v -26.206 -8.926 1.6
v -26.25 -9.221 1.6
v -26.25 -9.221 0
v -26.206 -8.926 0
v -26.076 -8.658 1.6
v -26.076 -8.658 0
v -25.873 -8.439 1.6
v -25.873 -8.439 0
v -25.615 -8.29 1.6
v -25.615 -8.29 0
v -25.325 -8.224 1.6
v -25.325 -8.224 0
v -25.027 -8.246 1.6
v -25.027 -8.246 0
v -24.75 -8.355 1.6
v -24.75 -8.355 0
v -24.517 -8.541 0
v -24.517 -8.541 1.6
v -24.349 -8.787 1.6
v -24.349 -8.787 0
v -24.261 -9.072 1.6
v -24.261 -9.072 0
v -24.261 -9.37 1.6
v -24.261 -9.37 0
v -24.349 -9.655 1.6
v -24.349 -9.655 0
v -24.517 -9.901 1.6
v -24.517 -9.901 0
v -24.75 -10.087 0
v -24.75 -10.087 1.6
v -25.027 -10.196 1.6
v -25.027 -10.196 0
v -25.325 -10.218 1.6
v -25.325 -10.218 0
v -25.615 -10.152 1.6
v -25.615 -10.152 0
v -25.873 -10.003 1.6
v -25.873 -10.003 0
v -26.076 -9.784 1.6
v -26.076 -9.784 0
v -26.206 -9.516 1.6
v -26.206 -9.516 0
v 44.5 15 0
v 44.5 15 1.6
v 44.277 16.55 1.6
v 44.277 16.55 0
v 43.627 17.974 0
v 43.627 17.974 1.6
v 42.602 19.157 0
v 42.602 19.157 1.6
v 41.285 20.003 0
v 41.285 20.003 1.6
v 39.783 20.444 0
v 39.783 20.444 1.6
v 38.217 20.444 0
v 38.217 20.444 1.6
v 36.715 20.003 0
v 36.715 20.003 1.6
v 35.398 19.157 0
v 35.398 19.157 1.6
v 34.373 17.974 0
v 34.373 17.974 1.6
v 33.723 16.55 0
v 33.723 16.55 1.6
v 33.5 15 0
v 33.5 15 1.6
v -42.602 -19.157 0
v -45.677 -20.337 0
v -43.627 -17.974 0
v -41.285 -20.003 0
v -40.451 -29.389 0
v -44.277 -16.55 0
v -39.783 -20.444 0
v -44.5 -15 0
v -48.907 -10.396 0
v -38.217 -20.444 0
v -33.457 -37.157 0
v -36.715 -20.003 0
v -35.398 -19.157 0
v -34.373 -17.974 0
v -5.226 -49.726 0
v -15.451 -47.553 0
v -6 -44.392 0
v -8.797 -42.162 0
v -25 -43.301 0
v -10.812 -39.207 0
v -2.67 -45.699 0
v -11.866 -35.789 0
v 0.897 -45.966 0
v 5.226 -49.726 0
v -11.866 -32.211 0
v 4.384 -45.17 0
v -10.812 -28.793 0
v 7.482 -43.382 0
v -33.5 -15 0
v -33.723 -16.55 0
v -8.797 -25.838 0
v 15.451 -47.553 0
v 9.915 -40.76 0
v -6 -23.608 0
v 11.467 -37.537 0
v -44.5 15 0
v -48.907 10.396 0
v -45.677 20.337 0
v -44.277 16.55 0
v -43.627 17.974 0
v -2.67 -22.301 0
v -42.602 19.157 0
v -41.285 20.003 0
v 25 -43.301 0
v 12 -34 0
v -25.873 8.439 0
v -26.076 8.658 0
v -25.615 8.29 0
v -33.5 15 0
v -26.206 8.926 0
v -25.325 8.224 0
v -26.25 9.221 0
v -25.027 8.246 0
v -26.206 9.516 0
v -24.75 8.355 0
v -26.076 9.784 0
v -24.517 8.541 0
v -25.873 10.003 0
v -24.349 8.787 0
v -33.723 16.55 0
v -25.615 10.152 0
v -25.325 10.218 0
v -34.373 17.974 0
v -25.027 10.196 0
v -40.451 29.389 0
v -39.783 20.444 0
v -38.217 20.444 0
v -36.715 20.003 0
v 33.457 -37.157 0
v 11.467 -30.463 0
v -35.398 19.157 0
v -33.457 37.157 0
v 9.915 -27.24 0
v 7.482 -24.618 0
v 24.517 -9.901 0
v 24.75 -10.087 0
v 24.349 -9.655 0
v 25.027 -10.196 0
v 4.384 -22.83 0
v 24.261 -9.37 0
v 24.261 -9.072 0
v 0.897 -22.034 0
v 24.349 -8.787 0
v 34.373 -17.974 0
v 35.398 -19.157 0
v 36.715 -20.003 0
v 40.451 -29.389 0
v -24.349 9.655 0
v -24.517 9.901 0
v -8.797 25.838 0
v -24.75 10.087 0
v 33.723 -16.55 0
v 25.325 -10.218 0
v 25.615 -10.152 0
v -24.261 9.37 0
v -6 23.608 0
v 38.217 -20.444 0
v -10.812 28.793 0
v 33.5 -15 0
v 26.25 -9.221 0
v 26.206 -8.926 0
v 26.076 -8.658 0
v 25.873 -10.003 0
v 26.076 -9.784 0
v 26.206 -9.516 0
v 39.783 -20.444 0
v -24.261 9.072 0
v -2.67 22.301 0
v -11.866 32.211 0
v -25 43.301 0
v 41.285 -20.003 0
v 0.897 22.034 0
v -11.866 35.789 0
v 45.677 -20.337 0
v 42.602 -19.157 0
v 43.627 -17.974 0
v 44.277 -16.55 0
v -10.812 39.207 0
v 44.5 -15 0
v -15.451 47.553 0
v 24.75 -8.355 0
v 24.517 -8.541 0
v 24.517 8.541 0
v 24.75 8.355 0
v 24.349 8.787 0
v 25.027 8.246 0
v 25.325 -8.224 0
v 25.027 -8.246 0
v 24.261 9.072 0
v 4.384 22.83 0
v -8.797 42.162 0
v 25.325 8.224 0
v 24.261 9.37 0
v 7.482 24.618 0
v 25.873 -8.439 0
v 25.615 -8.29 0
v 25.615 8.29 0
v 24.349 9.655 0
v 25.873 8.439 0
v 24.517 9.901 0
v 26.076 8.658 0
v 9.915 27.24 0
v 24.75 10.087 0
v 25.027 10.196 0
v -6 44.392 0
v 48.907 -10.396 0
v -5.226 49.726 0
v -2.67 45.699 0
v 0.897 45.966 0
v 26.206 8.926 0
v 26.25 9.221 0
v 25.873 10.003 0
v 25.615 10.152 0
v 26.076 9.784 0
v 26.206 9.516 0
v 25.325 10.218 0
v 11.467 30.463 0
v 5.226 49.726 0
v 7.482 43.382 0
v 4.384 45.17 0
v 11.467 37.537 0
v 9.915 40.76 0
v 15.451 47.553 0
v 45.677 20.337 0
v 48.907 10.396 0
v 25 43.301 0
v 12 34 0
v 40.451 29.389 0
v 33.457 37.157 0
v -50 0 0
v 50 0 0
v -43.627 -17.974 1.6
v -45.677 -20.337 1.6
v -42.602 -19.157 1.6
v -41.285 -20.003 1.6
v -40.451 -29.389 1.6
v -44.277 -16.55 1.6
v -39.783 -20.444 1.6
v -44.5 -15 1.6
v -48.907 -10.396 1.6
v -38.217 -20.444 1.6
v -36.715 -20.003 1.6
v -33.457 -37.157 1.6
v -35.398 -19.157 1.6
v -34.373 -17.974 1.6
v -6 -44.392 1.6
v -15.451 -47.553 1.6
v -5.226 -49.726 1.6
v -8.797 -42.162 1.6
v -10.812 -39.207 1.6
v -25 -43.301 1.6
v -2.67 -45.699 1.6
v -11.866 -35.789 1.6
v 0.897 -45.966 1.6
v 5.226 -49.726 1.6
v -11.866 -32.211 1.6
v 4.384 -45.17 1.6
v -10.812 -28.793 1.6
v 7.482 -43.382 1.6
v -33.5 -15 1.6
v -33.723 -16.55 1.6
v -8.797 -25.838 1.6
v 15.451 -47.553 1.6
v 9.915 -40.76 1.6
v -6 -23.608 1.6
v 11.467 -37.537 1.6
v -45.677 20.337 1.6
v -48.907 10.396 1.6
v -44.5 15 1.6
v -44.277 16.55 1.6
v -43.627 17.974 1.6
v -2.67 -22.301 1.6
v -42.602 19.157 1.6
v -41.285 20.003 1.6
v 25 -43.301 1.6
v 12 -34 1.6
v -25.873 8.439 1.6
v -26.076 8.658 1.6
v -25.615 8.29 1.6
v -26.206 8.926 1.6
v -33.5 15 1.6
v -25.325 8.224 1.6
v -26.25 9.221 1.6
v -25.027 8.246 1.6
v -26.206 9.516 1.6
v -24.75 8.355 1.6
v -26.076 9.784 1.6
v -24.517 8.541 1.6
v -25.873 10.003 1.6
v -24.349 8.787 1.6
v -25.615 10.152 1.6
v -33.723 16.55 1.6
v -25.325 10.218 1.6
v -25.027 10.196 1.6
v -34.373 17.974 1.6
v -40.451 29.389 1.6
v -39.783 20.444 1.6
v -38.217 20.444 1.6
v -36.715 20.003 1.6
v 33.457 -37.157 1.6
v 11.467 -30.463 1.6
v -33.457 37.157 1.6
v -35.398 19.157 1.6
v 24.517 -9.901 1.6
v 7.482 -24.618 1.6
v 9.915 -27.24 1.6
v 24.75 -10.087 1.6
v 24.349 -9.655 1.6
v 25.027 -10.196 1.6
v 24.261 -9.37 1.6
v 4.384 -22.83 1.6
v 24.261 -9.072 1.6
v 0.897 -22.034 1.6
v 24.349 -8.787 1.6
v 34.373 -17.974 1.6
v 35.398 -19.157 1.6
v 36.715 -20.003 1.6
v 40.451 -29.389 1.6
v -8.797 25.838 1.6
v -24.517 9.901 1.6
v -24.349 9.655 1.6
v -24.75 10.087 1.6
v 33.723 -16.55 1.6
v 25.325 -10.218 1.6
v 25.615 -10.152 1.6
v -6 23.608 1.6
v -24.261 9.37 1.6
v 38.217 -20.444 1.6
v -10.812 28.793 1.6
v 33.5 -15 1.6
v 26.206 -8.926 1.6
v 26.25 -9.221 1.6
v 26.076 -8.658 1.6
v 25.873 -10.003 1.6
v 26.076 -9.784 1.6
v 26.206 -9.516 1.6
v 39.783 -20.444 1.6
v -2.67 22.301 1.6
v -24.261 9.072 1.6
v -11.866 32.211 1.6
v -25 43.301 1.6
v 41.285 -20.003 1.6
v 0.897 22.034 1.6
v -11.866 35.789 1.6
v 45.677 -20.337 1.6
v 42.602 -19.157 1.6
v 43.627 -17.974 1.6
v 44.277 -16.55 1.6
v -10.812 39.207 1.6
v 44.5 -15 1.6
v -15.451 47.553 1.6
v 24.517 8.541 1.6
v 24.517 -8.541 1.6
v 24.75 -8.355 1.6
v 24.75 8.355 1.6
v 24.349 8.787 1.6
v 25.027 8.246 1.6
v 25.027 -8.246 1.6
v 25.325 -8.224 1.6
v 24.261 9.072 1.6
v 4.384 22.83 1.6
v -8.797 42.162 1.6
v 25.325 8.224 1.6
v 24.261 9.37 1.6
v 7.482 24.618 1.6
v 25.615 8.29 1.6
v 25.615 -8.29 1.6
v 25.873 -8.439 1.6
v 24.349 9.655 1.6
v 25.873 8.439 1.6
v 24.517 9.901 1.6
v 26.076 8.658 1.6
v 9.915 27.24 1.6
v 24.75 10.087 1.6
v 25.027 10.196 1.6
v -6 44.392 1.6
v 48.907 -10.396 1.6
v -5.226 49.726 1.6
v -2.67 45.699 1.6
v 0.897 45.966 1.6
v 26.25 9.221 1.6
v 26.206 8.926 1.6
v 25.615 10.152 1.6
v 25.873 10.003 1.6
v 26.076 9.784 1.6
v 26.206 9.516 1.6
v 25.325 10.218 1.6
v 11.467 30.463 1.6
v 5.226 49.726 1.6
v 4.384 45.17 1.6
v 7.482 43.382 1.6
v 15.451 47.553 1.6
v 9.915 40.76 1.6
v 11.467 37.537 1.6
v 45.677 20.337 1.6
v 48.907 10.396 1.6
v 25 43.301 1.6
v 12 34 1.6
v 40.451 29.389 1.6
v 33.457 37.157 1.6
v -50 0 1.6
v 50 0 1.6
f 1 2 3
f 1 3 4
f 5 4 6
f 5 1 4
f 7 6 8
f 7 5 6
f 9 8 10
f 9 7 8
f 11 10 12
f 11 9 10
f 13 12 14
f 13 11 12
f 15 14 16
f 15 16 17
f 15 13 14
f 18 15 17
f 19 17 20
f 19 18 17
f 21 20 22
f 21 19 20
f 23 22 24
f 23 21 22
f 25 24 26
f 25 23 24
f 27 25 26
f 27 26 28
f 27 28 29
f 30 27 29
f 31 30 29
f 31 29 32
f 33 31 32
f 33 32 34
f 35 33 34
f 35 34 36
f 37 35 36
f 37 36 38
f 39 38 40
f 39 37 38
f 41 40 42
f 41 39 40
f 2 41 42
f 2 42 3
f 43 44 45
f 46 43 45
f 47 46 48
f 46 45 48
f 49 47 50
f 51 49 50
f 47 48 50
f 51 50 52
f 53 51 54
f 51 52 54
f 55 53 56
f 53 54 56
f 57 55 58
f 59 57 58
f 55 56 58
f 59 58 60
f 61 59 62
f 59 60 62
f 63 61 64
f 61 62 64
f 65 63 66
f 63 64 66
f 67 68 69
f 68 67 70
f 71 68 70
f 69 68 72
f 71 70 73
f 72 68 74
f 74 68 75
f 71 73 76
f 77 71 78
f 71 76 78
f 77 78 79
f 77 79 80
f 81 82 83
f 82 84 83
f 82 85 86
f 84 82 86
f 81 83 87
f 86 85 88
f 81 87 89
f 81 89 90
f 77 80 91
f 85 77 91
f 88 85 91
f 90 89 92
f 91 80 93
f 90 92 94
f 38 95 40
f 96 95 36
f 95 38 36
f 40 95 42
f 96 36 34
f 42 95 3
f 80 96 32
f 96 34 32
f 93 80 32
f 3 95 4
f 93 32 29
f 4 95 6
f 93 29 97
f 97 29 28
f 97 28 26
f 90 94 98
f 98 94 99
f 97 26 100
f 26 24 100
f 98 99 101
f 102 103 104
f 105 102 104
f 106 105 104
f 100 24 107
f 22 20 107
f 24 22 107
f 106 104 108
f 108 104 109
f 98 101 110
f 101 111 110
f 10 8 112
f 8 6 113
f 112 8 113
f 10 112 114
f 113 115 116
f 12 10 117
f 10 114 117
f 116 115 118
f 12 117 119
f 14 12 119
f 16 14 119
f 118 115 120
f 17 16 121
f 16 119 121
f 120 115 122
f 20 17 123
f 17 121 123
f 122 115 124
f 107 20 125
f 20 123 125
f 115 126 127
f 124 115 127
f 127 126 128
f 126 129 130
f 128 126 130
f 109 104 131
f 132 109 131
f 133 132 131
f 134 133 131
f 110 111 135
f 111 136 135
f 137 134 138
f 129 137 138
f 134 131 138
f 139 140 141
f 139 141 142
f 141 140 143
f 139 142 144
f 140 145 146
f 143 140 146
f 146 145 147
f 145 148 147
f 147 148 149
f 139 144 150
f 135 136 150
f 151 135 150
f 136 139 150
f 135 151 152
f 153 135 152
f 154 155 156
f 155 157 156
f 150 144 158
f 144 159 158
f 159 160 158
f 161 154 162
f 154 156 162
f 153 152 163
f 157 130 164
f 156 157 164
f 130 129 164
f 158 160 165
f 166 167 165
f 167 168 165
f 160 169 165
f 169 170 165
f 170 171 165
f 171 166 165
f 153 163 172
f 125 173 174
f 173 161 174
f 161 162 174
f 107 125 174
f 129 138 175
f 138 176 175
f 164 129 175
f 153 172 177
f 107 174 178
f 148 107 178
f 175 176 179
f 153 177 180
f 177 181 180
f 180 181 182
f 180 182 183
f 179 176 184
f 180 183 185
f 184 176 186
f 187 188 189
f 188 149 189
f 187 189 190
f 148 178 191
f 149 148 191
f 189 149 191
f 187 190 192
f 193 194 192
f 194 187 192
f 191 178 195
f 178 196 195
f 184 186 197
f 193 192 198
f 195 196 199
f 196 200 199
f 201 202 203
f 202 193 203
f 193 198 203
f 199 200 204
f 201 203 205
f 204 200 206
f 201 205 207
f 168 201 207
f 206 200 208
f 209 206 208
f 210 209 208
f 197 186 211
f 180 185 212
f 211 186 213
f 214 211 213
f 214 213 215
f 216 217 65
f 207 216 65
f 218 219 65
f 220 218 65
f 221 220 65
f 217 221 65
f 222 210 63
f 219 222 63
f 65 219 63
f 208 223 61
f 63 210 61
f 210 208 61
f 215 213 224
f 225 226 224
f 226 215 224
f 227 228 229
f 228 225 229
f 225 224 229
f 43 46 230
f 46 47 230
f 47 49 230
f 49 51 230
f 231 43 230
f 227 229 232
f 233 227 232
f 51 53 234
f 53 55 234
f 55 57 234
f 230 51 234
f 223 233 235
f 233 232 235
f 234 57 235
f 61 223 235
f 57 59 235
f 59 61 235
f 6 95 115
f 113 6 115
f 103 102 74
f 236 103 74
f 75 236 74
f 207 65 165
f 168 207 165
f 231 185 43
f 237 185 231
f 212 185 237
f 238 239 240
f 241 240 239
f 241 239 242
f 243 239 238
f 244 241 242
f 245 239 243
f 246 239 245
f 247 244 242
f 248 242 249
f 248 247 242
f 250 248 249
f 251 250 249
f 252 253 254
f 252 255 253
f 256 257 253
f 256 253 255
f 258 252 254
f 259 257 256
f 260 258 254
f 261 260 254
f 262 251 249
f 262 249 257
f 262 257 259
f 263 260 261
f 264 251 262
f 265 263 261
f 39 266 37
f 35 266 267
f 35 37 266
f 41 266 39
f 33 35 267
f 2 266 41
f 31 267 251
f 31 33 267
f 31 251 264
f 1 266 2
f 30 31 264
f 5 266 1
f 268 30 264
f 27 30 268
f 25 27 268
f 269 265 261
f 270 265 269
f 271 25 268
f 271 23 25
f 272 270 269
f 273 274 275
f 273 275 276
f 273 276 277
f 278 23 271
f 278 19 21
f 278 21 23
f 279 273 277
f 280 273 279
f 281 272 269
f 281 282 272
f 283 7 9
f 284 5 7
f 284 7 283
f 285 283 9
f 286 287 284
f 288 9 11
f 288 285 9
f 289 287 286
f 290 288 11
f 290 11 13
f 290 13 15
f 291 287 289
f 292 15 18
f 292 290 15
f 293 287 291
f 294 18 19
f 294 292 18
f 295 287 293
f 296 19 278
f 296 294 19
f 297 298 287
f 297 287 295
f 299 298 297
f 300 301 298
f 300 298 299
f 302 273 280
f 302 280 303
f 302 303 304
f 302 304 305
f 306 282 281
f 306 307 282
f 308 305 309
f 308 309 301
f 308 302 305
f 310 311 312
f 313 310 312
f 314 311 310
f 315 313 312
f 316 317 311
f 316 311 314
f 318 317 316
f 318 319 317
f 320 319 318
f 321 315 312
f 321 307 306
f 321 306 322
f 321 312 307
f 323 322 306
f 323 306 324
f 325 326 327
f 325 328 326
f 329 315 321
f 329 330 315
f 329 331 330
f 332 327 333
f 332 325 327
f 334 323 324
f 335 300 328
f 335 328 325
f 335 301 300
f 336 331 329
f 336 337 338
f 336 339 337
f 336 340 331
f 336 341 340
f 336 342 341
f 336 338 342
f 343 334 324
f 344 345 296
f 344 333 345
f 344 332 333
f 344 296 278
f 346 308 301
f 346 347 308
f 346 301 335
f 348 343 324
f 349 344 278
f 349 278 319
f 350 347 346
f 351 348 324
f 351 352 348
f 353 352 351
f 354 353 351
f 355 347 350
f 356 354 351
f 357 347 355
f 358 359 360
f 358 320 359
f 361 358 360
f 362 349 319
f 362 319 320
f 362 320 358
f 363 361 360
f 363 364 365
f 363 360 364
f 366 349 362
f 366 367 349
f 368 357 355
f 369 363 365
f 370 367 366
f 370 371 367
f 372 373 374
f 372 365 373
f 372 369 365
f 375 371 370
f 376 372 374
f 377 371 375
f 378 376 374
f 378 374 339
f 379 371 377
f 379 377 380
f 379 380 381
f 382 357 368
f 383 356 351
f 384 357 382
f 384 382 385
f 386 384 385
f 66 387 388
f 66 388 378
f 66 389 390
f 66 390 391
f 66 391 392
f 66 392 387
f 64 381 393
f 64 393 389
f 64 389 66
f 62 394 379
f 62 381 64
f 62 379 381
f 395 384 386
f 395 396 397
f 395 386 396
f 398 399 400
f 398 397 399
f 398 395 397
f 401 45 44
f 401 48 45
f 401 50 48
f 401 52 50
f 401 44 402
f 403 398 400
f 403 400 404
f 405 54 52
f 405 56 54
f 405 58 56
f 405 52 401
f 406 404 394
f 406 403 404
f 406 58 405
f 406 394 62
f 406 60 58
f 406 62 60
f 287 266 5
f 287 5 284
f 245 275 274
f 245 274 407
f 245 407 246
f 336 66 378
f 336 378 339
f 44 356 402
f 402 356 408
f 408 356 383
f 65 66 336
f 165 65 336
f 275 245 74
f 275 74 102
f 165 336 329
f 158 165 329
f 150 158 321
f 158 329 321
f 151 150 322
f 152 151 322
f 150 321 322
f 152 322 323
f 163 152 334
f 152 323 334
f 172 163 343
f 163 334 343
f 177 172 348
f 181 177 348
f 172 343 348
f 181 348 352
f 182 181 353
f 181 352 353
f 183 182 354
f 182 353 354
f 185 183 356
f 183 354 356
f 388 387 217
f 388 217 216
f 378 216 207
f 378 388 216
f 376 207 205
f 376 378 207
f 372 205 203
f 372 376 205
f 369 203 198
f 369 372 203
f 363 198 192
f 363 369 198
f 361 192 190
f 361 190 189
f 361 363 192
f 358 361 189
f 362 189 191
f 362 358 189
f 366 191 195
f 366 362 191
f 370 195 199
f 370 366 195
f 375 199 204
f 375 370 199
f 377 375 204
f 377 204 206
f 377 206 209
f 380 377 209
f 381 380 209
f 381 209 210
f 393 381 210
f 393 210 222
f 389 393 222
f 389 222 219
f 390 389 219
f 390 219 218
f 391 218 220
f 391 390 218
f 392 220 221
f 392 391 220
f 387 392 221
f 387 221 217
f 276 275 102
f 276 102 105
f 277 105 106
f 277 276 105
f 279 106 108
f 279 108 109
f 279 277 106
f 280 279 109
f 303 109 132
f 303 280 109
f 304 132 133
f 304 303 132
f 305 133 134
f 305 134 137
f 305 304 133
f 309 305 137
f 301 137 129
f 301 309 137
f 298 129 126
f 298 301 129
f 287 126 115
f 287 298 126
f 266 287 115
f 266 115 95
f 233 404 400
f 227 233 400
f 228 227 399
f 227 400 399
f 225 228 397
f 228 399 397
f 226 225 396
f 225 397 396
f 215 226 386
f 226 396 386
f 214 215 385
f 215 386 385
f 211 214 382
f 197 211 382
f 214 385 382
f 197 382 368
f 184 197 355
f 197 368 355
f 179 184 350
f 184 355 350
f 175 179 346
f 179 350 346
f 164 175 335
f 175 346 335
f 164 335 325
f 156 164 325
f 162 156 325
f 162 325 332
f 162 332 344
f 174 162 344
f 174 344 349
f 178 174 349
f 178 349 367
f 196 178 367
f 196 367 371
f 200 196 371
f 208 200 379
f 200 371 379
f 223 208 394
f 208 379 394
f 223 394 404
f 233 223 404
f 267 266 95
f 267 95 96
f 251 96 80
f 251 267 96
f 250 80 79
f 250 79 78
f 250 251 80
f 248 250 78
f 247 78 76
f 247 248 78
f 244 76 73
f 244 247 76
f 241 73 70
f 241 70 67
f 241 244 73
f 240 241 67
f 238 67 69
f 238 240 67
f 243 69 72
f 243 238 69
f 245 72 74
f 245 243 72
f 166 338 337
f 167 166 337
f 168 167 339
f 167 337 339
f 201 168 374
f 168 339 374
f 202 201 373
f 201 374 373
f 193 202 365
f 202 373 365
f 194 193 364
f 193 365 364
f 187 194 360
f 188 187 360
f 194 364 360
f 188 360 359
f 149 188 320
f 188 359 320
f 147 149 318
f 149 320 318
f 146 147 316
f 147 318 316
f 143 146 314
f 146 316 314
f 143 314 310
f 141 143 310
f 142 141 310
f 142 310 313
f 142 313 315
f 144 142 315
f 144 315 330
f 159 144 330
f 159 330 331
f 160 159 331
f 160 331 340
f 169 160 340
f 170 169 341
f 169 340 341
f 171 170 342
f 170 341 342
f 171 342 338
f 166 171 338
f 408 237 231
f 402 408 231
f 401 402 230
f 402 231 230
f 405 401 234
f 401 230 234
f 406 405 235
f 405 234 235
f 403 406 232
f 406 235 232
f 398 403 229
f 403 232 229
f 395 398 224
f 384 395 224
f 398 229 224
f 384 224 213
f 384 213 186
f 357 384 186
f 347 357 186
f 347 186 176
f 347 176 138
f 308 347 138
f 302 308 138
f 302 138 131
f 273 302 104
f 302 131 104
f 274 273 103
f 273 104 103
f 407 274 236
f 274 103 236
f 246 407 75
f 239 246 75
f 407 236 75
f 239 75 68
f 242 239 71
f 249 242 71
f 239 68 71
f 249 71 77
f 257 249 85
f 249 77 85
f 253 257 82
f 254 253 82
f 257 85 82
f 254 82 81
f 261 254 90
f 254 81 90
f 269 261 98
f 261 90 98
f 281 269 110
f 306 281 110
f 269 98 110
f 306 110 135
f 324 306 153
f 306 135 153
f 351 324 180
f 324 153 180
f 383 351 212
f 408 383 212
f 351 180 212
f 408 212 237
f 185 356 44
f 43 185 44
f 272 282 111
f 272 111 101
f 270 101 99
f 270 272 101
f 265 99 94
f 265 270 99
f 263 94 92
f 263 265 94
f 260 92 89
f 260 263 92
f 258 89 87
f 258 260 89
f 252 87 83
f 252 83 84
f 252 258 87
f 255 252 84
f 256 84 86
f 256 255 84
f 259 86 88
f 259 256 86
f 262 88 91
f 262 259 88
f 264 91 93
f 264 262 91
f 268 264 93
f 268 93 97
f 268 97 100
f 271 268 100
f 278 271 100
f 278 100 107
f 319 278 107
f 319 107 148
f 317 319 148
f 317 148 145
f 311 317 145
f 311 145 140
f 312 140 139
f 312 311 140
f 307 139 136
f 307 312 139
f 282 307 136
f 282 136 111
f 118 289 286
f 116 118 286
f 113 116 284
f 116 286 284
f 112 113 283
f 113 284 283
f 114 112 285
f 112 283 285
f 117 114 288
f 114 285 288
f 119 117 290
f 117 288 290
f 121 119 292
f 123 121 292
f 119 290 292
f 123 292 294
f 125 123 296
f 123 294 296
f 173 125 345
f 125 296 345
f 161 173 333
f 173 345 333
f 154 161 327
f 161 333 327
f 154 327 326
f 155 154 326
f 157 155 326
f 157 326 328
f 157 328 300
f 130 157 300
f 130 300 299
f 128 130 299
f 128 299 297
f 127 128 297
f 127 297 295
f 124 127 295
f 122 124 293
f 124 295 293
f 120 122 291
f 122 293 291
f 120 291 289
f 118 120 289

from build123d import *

# Parameters (mm, degrees)
ESQUISSE1_R               = 50
BOSS_EXTRU_1_DEPTH        = 1.6
ENL_V_MAT_EXTRU_1_DEPTH   = 1.6
ESQUISSE4_R               = 12
ENL_V_MAT_EXTRU_3_DEPTH   = 1.6
ESQUISSE7_R               = 1
ENL_V_MAT_EXTRU_4_DEPTH   = 1.6
SYM_TRIE8_COPY_1_SKETCH_R = 1
SYM_TRIE8_COPY_1_DEPTH    = 1.6


with BuildPart() as part:
    # Esquisse1 → Boss.-Extru.1 (new body)
    with BuildSketch(Plane.XY):
        Circle(ESQUISSE1_R)
    extrude(amount=BOSS_EXTRU_1_DEPTH)

    # Esquisse2 → Enlèv. mat.-Extru.1 (cut)
    with BuildSketch(Plane.XY.offset(1.6)):
        with BuildLine():
            Line((-33.5, 15), (-33.5, -15))
            ThreePointArc((-33.5, -15), (-39, -20.5), (-44.5, -15))
            Line((-44.5, -15), (-44.5, 15))
            ThreePointArc((-44.5, 15), (-39, 20.5), (-33.5, 15))
        make_face()
    enl_v_mat_extru_1 = extrude(amount=-ENL_V_MAT_EXTRU_1_DEPTH, mode=Mode.SUBTRACT)

    # Symétrie1: Enlèv. mat.-Extru.1 across plane
    add(enl_v_mat_extru_1.mirror(Plane(origin=(0, 0, 0), x_dir=(0, 0, 1), z_dir=(1, 0, 0))), mode=Mode.SUBTRACT)

    # Esquisse4 → Enlèv. mat.-Extru.3 (cut)
    with BuildSketch(Plane.XY.offset(1.6)):
        with Locations((0, 34)):
            Circle(ESQUISSE4_R)
    enl_v_mat_extru_3 = extrude(amount=-ENL_V_MAT_EXTRU_3_DEPTH, mode=Mode.SUBTRACT)

    # Symétrie6: Enlèv. mat.-Extru.3 across plane
    add(enl_v_mat_extru_3.mirror(Plane.ZX), mode=Mode.SUBTRACT)

    # Esquisse7 → Enlèv. mat.-Extru.4 (cut)
    with BuildSketch(Plane.XY.offset(1.6)):
        with Locations((25.25, -9.221094574)):
            Circle(ESQUISSE7_R)
    enl_v_mat_extru_4 = extrude(amount=-ENL_V_MAT_EXTRU_4_DEPTH, mode=Mode.SUBTRACT)

    # Symétrie7: Enlèv. mat.-Extru.4 across plane
    add(enl_v_mat_extru_4.mirror(Plane.ZX), mode=Mode.SUBTRACT)

    # Symétrie8: Enlèv. mat.-Extru.4 across plane
    add(enl_v_mat_extru_4.mirror(Plane(origin=(0, 0, 0), x_dir=(0, 0, 1), z_dir=(1, 0, 0))), mode=Mode.SUBTRACT)

    # Symétrie8 copy 1 sketch → Symétrie8 copy 1 (cut)
    with BuildSketch(Plane(origin=(0, 0, 1.6), x_dir=(-1, 0, 0), z_dir=(0, 0, 1))):
        with Locations((25.25, -9.221094574)):
            Circle(SYM_TRIE8_COPY_1_SKETCH_R)
    extrude(amount=-SYM_TRIE8_COPY_1_DEPTH, mode=Mode.SUBTRACT)


solid = part.part
